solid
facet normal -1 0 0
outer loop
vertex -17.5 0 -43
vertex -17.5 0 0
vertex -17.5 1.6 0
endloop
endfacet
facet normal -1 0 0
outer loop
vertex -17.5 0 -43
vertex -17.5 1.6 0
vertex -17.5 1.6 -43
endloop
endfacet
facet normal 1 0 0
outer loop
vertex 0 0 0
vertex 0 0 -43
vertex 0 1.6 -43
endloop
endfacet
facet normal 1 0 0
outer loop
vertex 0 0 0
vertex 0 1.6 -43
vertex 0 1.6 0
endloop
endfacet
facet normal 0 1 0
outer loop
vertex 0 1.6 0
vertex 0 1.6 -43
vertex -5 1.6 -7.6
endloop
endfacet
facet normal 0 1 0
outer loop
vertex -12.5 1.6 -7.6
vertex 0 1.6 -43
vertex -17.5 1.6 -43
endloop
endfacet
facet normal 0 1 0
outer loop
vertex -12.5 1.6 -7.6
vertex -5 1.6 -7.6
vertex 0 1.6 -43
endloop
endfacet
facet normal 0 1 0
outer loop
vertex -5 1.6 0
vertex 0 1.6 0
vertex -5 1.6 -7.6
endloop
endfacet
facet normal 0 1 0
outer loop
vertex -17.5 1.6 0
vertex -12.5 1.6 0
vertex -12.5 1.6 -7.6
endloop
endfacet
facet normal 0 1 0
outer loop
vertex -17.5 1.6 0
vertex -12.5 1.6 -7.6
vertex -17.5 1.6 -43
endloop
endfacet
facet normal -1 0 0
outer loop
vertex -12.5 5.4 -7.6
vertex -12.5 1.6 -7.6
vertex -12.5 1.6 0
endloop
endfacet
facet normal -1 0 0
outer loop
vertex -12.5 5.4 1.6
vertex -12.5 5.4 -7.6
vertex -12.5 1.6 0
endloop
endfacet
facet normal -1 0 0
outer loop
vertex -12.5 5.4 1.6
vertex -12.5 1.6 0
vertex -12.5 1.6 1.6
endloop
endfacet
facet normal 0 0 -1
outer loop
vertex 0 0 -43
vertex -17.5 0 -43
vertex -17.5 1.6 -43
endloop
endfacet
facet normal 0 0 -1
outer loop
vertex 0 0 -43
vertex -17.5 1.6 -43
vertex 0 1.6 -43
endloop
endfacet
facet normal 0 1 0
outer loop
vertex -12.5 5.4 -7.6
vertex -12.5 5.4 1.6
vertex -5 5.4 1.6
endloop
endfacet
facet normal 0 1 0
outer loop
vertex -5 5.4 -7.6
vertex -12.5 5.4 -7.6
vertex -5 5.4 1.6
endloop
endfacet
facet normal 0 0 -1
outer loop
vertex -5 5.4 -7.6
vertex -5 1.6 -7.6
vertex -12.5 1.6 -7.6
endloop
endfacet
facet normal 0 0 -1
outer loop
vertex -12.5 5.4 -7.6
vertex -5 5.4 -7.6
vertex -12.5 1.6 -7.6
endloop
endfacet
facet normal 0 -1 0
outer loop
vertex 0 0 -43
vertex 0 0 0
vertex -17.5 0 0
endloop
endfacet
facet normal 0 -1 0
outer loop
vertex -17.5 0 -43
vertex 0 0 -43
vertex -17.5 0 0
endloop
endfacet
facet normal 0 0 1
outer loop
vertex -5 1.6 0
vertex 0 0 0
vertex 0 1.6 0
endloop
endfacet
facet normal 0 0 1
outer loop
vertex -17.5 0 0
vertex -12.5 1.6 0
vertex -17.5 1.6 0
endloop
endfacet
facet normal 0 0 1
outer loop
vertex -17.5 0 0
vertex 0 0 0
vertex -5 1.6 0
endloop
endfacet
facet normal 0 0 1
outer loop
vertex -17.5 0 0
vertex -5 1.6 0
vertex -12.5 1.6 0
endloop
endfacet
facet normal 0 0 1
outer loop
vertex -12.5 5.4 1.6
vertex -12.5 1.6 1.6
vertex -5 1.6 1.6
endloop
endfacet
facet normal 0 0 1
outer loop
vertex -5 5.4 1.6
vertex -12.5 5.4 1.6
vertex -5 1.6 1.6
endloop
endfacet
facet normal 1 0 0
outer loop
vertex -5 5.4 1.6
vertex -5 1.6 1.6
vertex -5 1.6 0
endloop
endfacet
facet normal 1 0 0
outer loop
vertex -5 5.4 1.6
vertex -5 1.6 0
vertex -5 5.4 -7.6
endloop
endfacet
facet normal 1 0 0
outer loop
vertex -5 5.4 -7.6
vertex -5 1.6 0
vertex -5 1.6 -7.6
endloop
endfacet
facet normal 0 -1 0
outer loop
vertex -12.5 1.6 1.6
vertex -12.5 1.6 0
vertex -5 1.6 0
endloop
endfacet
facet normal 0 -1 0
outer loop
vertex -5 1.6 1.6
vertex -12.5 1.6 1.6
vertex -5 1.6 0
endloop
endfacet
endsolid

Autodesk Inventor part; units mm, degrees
ref_plane "YZ Plane" through (0, 0, 0) normal (1, 0, 0) x (0, 1, 0)
ref_plane "XZ Plane" through (0, 0, 0) normal (0, 1, 0) x (-1, 0, 0)
ref_plane "XY Plane" through (0, 0, 0) normal (0, 0, 1) x (1, 0, 0)
sketch "Sketch1" plane through (0, 0, 0) normal (0, 1, 0) x (-1, 0, 0)
  line L0 (0, 0) -> (17.5, 0)
  line L1 (17.5, 0) -> (17.5, -43)
  line L2 (17.5, -43) -> (0, -43)
  line L3 (0, -43) -> (0, 0)
  dimension "d0" = 43
  dimension "d1" = 17.5
extrude "Extrusion1" add sketch "Sketch1" along normal blind 1.6
sketch "Sketch2" plane through (0, 1.6, 0) normal (0, 1, 0) x (1, 0, 0)
  line L0 (-17.5, 0) -> (0, 0) projected
  line L1 (-8.75, 0) -> (-8.75, 8.3818) construction
  line L2 (-5, 7.6) -> (-12.5, 7.6)
  line L3 (-12.5, 7.6) -> (-12.5, -1.6)
  line L4 (-12.5, -1.6) -> (-5, -1.6)
  line L5 (-5, -1.6) -> (-5, 7.6)
  line L6 (-5, 7.6) -> (-12.5, -1.6) construction
  line L7 (-12.5, 7.6) -> (-5, -1.6) construction
  point P0 (-8.75, 3)
  dimension "d4" = 9.2
  dimension "d5" = 7.5
  dimension "d6" = 1.6
extrude "Extrusion2" add sketch "Sketch2" along normal blind 3.8
properties part number "Arduino"
